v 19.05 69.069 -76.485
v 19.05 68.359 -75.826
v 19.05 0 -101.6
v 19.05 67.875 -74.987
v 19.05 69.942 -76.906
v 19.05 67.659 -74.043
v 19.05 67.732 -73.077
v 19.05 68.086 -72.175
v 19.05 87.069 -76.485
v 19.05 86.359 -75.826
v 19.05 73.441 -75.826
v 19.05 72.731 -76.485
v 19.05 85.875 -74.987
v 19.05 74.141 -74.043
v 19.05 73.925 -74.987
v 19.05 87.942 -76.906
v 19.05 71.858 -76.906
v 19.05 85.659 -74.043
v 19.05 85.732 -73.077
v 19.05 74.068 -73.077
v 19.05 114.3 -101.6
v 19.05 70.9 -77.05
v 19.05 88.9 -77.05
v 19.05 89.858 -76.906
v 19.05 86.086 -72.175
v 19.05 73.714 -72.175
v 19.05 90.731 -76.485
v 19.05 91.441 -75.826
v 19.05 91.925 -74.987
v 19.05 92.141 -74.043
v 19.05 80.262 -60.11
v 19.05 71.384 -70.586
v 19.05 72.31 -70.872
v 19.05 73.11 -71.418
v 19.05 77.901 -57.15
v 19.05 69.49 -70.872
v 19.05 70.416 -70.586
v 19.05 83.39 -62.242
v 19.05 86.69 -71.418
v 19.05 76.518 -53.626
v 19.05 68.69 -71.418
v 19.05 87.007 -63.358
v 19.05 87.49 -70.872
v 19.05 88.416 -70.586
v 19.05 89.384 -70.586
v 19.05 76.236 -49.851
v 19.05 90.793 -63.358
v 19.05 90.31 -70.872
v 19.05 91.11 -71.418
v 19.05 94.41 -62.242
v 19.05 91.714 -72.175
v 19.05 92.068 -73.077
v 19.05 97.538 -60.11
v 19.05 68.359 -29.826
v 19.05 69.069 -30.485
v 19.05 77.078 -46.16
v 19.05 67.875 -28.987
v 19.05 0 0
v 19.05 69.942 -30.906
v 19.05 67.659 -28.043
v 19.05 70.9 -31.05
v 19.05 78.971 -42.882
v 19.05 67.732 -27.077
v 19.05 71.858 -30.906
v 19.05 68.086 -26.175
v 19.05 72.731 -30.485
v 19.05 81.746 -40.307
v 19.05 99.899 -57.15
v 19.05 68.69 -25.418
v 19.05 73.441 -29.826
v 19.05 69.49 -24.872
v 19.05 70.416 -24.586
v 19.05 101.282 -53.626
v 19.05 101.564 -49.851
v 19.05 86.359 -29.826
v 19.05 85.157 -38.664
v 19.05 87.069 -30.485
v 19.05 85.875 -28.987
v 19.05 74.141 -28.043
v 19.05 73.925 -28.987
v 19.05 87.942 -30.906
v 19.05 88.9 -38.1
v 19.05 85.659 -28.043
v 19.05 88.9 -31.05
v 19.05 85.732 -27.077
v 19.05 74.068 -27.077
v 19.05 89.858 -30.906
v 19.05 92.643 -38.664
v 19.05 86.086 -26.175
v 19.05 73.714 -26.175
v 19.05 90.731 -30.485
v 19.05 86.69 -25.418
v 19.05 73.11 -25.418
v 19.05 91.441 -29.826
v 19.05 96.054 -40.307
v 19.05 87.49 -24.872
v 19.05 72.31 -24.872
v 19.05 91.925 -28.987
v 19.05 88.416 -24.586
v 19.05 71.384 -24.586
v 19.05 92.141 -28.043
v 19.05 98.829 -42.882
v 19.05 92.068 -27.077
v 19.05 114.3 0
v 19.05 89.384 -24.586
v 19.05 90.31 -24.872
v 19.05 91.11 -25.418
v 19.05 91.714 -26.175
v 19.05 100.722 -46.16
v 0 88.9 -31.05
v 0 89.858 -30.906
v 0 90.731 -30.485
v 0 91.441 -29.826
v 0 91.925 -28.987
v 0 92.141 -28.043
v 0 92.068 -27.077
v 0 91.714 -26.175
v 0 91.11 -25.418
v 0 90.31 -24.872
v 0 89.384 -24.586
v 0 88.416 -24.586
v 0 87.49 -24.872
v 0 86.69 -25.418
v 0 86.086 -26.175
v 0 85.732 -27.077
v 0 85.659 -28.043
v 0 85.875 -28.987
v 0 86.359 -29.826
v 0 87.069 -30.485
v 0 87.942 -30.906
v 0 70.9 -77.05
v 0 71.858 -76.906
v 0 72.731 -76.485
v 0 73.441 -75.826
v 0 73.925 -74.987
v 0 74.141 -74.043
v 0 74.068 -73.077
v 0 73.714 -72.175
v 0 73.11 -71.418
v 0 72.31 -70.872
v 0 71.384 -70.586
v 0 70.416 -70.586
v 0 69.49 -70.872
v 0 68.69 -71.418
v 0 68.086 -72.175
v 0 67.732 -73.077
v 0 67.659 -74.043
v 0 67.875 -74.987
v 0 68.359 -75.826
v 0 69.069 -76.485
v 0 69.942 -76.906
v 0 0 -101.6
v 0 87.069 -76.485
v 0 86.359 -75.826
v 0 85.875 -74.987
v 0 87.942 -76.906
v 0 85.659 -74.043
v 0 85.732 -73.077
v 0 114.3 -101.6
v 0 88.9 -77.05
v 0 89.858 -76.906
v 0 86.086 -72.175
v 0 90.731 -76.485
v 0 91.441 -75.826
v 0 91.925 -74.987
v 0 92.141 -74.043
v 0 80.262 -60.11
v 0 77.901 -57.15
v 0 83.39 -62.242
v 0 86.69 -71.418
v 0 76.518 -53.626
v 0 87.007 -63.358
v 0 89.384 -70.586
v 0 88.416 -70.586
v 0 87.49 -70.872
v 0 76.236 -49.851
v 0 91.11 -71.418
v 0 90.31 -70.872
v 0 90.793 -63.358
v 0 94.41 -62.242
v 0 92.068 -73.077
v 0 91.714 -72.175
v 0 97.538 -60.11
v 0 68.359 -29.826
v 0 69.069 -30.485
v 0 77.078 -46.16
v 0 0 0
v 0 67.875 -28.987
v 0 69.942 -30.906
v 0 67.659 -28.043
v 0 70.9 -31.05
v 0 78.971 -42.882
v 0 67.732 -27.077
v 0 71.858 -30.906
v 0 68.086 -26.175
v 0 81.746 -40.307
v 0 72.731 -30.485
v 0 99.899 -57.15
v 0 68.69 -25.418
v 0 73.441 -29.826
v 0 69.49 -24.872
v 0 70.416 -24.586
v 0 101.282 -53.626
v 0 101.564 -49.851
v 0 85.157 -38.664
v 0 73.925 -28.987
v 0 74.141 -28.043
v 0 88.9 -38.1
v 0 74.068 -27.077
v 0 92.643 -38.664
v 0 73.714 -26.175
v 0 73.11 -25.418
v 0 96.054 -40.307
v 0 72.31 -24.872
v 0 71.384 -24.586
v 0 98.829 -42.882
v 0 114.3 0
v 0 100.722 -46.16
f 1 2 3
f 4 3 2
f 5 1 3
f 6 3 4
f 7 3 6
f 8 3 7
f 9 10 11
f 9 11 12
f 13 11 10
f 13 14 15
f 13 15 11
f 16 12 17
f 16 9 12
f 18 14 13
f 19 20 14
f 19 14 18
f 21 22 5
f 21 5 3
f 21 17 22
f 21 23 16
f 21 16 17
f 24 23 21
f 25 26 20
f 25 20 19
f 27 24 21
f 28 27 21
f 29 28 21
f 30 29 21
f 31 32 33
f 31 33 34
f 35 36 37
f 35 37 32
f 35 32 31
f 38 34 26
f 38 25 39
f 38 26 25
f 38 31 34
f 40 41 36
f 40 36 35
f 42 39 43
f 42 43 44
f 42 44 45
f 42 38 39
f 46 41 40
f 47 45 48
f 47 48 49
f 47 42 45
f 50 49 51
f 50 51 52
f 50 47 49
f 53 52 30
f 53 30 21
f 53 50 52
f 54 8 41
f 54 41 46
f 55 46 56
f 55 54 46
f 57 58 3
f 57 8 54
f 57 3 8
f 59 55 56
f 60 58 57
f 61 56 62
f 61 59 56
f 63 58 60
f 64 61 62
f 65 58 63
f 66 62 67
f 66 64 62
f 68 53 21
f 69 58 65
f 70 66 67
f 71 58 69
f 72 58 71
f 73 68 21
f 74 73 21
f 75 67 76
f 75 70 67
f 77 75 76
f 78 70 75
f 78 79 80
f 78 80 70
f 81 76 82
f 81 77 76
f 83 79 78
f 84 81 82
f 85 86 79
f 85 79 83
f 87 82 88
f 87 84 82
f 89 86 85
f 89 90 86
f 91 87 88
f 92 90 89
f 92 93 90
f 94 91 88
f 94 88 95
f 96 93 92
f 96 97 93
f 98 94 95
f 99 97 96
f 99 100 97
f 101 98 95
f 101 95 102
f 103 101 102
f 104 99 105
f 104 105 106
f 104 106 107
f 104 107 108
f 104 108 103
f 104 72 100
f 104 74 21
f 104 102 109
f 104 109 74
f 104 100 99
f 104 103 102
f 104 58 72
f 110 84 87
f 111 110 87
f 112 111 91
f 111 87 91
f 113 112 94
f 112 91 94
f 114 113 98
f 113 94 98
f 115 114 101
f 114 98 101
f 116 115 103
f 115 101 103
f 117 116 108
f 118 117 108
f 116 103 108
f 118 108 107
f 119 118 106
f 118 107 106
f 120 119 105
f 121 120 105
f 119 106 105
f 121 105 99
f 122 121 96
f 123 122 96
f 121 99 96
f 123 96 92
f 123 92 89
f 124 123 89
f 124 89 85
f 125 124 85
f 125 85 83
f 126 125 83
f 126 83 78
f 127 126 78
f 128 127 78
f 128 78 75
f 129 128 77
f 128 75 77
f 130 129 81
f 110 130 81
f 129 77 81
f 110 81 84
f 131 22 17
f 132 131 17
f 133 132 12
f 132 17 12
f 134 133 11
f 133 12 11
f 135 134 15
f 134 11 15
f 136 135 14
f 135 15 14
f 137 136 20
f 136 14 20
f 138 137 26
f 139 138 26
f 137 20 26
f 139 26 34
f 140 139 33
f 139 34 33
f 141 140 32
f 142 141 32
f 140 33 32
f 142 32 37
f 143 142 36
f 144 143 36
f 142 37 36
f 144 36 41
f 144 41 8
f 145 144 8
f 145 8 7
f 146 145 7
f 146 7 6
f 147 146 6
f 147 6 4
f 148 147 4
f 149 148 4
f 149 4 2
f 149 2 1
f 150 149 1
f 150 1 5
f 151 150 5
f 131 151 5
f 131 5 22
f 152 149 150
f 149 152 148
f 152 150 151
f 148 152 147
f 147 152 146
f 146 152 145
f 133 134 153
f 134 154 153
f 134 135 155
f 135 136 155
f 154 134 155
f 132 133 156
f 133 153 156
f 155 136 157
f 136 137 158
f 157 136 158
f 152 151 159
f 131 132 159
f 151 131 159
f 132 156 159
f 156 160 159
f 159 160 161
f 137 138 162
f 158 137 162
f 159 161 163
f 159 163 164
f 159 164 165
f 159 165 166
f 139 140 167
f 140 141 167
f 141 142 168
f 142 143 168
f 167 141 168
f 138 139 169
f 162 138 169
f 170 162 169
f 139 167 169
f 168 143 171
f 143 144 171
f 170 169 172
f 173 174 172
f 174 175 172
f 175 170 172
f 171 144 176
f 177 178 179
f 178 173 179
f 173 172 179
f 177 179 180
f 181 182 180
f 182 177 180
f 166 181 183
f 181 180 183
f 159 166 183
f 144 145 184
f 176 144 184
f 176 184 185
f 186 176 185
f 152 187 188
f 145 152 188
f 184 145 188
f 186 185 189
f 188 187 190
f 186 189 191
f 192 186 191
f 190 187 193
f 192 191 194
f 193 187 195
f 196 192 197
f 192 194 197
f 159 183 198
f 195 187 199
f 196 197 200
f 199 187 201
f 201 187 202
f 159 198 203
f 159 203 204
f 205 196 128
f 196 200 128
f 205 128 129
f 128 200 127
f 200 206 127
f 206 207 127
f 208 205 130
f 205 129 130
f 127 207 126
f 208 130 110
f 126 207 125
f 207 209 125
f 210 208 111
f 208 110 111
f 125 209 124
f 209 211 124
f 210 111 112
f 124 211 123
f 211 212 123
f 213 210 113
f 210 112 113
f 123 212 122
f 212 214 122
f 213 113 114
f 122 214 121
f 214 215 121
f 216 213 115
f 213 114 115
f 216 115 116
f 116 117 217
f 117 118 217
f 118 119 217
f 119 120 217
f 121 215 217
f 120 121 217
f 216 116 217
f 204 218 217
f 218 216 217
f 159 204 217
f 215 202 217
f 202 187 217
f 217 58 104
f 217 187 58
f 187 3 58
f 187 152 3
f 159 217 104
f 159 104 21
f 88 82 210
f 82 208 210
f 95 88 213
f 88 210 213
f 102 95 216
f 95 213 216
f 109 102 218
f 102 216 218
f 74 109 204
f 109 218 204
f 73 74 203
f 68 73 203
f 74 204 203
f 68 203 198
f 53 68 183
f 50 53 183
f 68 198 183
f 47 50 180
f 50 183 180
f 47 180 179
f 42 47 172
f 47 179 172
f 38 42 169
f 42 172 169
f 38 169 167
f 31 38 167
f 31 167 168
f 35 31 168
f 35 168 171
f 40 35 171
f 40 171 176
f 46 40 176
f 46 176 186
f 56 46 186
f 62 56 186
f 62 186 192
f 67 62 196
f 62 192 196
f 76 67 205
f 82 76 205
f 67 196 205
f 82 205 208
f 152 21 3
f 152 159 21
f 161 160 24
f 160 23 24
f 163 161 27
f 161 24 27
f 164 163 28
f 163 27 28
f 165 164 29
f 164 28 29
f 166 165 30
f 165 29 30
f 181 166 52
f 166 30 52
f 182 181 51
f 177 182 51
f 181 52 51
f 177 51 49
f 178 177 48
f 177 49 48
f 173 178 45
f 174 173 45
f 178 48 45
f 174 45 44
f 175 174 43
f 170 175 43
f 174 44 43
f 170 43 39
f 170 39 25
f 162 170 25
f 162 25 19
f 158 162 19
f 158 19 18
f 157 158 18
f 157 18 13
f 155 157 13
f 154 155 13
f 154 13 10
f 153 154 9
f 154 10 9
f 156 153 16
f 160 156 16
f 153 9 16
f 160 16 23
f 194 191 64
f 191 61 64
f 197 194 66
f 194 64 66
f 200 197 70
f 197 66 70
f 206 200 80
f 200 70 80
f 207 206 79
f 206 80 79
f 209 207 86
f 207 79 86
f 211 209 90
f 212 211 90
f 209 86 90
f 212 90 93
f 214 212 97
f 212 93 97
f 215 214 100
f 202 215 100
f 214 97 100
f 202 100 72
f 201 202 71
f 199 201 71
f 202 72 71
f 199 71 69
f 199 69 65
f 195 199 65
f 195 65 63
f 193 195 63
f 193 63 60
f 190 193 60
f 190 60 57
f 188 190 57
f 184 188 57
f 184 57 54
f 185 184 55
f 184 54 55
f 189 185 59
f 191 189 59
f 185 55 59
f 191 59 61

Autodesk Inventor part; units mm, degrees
ref_plane "YZ Plane" through (0, 0, 0) normal (1, 0, 0) x (0, 1, 0)
ref_plane "XZ Plane" through (0, 0, 0) normal (0, 1, 0) x (-1, 0, 0)
ref_plane "XY Plane" through (0, 0, 0) normal (0, 0, 1) x (1, 0, 0)
sketch "Sketch1" plane through (0, 0, 0) normal (1, 0, 0) x (0, 1, 0)
  line L0 (0, 0) -> (114.3, 0)
  line L1 (114.3, 0) -> (114.3, -101.6)
  line L2 (114.3, -101.6) -> (0, -101.6)
  line L3 (0, -101.6) -> (0, 0)
  dimension "d0" = 114.3
  dimension "d1" = 101.6
extrude "Extrusion1" add sketch "Sketch1" along normal blind 19.05
sketch "Sketch2" plane through (19.05, 0, 0) normal (1, 0, 0) x (0, 0, -1)
  circle A0 centre (27.8, 88.9) radius 3.2499
  circle A1 centre (73.8, 88.9) radius 3.2499
  circle A2 centre (73.8, 70.9) radius 3.2499
  circle A3 centre (27.8, 70.9) radius 3.2499
  line L0 (27.8, 88.9) -> (27.8, 70.9)
  line L1 (27.8, 88.9) -> (73.8, 88.9)
  line L2 (27.8, 70.9) -> (73.8, 70.9)
  line L3 (73.8, 70.9) -> (73.8, 88.9)
  line L4 (0, 114.3) -> (0, 0) projected
  line L5 (101.6, 0) -> (101.6, 114.3) projected
  line L6 (101.6, 114.3) -> (0, 114.3) projected
  dimension "d4" = 6.4999
  dimension "d5" = 6.4999
  dimension "d6" = 6.4999
  dimension "d7" = 6.4999
  dimension "d8" = 46
  dimension "d9" = 18
  dimension "d10" = 27.8
  dimension "d11" = 101.6
  dimension "d12" = 25.4
extrude "Extrusion2" cut sketch "Sketch2" against normal blind 19.05 contours L1 L0 A0 | A0 L0 L1 | L1 L3 A1 | A1 L3 L1 | L0 L2 A3 | A3 L2 L0 | L3 L2 A2 | A2 L2 L3
sketch "Sketch4" plane through (0, 0, 0) normal (-1, 0, 0) x (0, 0, 1)
  circle A0 centre (-50.8, 88.9) radius 12.7
  line L0 (-101.6, 114.3) -> (0, 114.3) projected
  circle A1 centre (-73.8, 88.9) radius 3.2499 projected
  circle A2 centre (-27.8, 88.9) radius 3.2499 projected
  line L1 (-73.8, 88.9) -> (-27.8, 88.9)
  point P0 (0, 0)
  dimension "d15" = 25.4
extrude "Extrusion3" cut sketch "Sketch4" against normal blind 19.05 contours L1 A0 | A0 L1
equation "\"d10\" = -0.5 * d8 + 0.5 * d11"
properties part number "X Axis Plate"
